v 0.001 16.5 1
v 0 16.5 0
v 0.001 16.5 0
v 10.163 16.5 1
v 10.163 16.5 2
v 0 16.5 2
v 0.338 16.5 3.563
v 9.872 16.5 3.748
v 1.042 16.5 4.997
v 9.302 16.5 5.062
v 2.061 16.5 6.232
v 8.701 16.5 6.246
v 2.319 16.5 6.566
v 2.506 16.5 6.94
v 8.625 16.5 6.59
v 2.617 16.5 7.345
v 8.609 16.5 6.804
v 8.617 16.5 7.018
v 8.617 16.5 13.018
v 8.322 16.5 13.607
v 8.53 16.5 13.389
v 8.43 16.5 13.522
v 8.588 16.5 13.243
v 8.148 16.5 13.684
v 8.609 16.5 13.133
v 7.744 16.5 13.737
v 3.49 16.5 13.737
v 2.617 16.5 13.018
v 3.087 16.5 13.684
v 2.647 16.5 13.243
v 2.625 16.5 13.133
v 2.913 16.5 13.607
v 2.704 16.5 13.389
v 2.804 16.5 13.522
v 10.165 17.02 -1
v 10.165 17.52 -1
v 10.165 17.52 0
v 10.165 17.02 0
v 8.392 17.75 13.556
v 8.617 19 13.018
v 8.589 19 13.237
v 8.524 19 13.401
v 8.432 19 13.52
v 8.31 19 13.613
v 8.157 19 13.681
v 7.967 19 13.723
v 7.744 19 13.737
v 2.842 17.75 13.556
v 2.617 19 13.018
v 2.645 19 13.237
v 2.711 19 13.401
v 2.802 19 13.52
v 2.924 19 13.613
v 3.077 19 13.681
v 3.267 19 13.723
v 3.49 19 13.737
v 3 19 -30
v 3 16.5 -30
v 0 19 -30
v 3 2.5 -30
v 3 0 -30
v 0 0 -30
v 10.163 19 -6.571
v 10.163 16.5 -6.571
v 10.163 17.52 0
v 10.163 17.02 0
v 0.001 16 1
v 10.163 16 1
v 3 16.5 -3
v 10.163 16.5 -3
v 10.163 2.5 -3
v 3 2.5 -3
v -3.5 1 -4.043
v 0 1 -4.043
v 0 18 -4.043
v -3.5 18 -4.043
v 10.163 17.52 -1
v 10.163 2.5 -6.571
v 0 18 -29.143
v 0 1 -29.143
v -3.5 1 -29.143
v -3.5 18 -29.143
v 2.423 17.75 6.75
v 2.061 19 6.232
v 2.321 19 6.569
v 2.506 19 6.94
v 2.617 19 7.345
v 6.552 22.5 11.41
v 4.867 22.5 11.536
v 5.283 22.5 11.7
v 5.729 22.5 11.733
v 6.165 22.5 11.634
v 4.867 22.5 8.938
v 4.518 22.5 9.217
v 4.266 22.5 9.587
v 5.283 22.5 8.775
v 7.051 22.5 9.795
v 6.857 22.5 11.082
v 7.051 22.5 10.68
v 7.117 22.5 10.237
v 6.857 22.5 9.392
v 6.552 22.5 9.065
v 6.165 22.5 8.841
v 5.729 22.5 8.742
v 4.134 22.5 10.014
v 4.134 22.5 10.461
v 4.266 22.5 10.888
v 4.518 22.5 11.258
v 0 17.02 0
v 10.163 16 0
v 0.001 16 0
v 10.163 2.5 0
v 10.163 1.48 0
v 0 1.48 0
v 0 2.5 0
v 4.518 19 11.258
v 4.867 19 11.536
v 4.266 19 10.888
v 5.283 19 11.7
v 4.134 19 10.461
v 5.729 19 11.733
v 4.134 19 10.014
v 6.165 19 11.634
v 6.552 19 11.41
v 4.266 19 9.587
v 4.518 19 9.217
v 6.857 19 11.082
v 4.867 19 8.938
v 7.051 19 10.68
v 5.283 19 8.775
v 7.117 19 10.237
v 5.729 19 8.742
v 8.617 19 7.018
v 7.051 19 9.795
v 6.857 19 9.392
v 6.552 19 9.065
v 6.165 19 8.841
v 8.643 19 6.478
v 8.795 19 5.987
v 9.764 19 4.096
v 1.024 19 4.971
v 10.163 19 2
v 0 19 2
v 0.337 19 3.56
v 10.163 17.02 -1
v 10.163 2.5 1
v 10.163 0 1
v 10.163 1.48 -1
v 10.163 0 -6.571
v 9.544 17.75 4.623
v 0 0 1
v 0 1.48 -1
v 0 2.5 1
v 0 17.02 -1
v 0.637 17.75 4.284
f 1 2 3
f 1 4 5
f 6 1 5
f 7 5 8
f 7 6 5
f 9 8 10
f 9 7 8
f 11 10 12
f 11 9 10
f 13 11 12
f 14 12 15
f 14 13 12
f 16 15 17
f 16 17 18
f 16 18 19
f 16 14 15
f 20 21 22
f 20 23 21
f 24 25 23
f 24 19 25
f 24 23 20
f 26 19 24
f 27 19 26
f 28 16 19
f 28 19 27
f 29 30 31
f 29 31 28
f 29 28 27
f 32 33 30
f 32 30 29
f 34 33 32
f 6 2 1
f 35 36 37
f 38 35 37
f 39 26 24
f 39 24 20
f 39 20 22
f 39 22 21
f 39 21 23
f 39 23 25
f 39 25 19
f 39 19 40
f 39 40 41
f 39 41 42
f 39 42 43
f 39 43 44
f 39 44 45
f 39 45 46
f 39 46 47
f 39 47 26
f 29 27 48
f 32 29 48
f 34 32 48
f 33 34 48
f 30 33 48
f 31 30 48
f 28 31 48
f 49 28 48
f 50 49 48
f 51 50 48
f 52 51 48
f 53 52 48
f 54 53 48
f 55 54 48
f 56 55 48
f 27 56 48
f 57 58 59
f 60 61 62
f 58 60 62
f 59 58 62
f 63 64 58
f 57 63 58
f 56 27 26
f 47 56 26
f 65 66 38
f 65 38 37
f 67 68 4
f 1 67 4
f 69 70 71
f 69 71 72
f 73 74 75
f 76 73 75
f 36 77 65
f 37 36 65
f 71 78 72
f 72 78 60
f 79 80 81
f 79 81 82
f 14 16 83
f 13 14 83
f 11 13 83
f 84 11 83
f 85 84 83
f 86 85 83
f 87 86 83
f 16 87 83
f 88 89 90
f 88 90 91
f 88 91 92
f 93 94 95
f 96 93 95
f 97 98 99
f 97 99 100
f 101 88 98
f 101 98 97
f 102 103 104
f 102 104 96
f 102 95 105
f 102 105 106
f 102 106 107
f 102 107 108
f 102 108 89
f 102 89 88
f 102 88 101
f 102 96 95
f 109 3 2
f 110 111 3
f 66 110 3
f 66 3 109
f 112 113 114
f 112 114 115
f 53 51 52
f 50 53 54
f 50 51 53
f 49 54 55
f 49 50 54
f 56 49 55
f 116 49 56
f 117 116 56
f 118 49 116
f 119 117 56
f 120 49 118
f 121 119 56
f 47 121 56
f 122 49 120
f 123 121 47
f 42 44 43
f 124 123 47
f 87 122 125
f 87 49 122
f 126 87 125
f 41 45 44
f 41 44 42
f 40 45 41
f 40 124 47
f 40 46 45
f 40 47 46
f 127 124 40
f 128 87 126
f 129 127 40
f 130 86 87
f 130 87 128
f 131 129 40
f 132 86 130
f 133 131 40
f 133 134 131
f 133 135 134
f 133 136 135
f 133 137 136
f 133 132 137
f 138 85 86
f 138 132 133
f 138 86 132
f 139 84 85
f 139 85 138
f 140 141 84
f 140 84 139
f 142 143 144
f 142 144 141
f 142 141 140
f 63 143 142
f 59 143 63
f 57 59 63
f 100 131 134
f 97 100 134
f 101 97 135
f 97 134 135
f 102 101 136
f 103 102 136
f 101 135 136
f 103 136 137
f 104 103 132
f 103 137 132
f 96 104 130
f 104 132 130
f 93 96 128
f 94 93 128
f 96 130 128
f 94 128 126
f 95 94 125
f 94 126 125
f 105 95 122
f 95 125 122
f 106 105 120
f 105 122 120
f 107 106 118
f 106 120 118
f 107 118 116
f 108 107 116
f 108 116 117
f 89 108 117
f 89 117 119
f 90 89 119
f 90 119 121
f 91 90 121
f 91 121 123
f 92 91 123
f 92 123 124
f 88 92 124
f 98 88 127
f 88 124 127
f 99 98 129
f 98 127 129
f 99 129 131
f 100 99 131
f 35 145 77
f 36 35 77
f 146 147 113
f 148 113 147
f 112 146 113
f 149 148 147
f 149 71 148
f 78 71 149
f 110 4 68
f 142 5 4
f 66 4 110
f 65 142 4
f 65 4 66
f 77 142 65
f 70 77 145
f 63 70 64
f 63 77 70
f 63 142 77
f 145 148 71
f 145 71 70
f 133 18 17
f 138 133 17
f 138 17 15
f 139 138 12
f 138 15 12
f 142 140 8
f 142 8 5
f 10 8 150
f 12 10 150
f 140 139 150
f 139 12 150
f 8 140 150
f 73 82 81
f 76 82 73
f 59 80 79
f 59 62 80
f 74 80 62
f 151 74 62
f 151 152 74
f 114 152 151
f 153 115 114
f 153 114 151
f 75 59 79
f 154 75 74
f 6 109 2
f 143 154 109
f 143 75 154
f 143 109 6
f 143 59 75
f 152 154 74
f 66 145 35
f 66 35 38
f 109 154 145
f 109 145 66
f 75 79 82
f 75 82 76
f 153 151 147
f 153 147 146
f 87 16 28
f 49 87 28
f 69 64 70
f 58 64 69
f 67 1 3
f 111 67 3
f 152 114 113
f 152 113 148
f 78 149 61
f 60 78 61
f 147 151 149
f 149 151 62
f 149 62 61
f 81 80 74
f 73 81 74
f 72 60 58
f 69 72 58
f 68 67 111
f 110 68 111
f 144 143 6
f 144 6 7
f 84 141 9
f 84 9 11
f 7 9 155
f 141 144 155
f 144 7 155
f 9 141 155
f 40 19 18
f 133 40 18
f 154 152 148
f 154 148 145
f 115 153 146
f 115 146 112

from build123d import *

# Parameters (mm, degrees)
SALIENTE_EXTRUIR1_DEPTH    = 19
CROQUIS2_W                 = 9.87256946
CROQUIS2_H                 = 14
CORTAR_EXTRUIR1_DEPTH      = 27
CORTAR_EXTRUIR2_DEPTH      = 11.163106866
CORTAR_EXTRUIR2_DEPTH_BACK = 1.0000001
CROQUIS11_W                = 1
CROQUIS11_H                = 1.020123201
CORTAR_EXTRUIR3_DEPTH      = 33
CROQUIS12_R                = 1.5
SALIENTE_EXTRUIR3_DEPTH    = 3.5
CROQUIS13_W                = 25.1
CROQUIS13_H                = 17
SALIENTE_EXTRUIR5_DEPTH    = 3.5
CROQUIS16_W                = 1
CROQUIS16_H                = 0.5
SALIENTE_EXTRUIR8_DEPTH    = 10.162
CROQUIS19_W                = 1
CROQUIS19_H                = 0.5
SALIENTE_EXTRUIR9_DEPTH    = 10.165


with BuildPart() as part:
    # Croquis1 → Saliente-Extruir1 (new body)
    with BuildSketch(Plane(origin=(0, 0, 0), x_dir=(1, 0, 0), z_dir=(0, 1, 0))):
        with BuildLine():
            Line((0, 30), (0, 0))
            Line((0, 0), (0, -2))
            add(Edge.make_bspline(
                [(0, -2), (0.244064913, -4.453043064), (2.060905279, -6.231862145)],
                knots=[0, 0, 0, 1, 1, 1], degree=2))
            add(Edge.make_bspline(
                [(2.060905279, -6.231862145), (2.507004014, -6.712573557), (2.617207224, -7.344647716)],
                knots=[0, 0, 0, 1, 1, 1], degree=2))
            Line((2.617207224, -7.344647716), (2.617207224, -13.018311654))
            add(Edge.make_bspline(
                [(2.617207224, -13.018311654), (2.630895377, -13.73499915), (3.489917654, -13.737380921)],
                knots=[0, 0, 0, 1, 1, 1], degree=2))
            Line((3.489917654, -13.737380921), (7.744496795, -13.737380921))
            add(Edge.make_bspline(
                [(8.617207224, -13.018311654), (8.603519071, -13.73499915), (7.744496795, -13.737380921)],
                knots=[0, 0, 0, 1, 1, 1], degree=2))
            Line((8.617207224, -13.018311654), (8.617207224, -7.018311654))
            add(Edge.make_bspline(
                [(8.617207224, -7.018311654), (8.52941254, -6.066211773), (9.815332332, -4.707225326), (10.076873528, -2.886889338), (10.163106766, -2)],
                knots=[0, 0, 0, 0, 0.490316762, 1, 1, 1, 1], degree=3))
            Line((10.163106766, -2), (10.163106766, 0))
            Line((10.163106766, 0), (10.163106766, 6.570533479))
            Line((10.163106766, 6.570533479), (3, 30))
            Line((3, 30), (0, 30))
        make_face()
    extrude(amount=SALIENTE_EXTRUIR1_DEPTH)

    # Croquis2 → Cortar-Extruir1 (cut)
    with BuildSketch(Plane(origin=(0, 0, -30), x_dir=(-1, 0, 0), z_dir=(0, 0, -1))):
        with Locations((-7.93628473, 9.5)):
            Rectangle(CROQUIS2_W, CROQUIS2_H)
    extrude(amount=-CORTAR_EXTRUIR1_DEPTH, mode=Mode.SUBTRACT)

    # Croquis10 → Cortar-Extruir2 (cut, two sides)
    with BuildSketch(Plane(origin=(0, 0, 0), x_dir=(0, 0, -1), z_dir=(1, 0, 0))) as cortar_extruir2_sk:
        Polygon((1, 2.5), (1, 16.5), (-13.737380921, 16.5), (-13.737380921, 0), (-1, 0), (-1, 2.5), align=None)
    extrude(amount=CORTAR_EXTRUIR2_DEPTH, mode=Mode.SUBTRACT)
    extrude(cortar_extruir2_sk.sketch, amount=-CORTAR_EXTRUIR2_DEPTH_BACK, mode=Mode.SUBTRACT)

    # Croquis11 → Cortar-Extruir3 (cut)
    with BuildSketch(Plane(origin=(0, 0, 0), x_dir=(0, 0, -1), z_dir=(1, 0, 0))):
        with Locations((0.5, 1.9899384)):
            Rectangle(CROQUIS11_W, CROQUIS11_H)
        with Locations((0.5, 17.010061601)):
            Rectangle(CROQUIS11_W, CROQUIS11_H)
    extrude(amount=CORTAR_EXTRUIR3_DEPTH, mode=Mode.SUBTRACT)

    # Croquis12 → Saliente-Extruir3 (add)
    with BuildSketch(Plane(origin=(0, 19, 0), x_dir=(1, 0, 0), z_dir=(0, 1, 0))):
        with Locations((5.617207224, -10.237380921)):
            Circle(CROQUIS12_R)
    extrude(amount=SALIENTE_EXTRUIR3_DEPTH)

    # Croquis13 → Saliente-Extruir5 (add)
    with BuildSketch(Plane.ZY):
        with Locations((-16.592912937, 9.5)):
            Rectangle(CROQUIS13_W, CROQUIS13_H)
    extrude(amount=SALIENTE_EXTRUIR5_DEPTH)

    # Croquis16 → Saliente-Extruir8 (add)
    with BuildSketch(Plane(origin=(10.163106766, 0, 0), x_dir=(0, 0, -1), z_dir=(1, 0, 0))):
        with Locations((-0.5, 16.25)):
            Rectangle(CROQUIS16_W, CROQUIS16_H)
    extrude(amount=-SALIENTE_EXTRUIR8_DEPTH)

    # Croquis19 → Saliente-Extruir9 (add)
    with BuildSketch(Plane.ZY):
        with Locations((-0.5, 17.270123201)):
            Rectangle(CROQUIS19_W, CROQUIS19_H)
    extrude(amount=-SALIENTE_EXTRUIR9_DEPTH)


solid = part.part
